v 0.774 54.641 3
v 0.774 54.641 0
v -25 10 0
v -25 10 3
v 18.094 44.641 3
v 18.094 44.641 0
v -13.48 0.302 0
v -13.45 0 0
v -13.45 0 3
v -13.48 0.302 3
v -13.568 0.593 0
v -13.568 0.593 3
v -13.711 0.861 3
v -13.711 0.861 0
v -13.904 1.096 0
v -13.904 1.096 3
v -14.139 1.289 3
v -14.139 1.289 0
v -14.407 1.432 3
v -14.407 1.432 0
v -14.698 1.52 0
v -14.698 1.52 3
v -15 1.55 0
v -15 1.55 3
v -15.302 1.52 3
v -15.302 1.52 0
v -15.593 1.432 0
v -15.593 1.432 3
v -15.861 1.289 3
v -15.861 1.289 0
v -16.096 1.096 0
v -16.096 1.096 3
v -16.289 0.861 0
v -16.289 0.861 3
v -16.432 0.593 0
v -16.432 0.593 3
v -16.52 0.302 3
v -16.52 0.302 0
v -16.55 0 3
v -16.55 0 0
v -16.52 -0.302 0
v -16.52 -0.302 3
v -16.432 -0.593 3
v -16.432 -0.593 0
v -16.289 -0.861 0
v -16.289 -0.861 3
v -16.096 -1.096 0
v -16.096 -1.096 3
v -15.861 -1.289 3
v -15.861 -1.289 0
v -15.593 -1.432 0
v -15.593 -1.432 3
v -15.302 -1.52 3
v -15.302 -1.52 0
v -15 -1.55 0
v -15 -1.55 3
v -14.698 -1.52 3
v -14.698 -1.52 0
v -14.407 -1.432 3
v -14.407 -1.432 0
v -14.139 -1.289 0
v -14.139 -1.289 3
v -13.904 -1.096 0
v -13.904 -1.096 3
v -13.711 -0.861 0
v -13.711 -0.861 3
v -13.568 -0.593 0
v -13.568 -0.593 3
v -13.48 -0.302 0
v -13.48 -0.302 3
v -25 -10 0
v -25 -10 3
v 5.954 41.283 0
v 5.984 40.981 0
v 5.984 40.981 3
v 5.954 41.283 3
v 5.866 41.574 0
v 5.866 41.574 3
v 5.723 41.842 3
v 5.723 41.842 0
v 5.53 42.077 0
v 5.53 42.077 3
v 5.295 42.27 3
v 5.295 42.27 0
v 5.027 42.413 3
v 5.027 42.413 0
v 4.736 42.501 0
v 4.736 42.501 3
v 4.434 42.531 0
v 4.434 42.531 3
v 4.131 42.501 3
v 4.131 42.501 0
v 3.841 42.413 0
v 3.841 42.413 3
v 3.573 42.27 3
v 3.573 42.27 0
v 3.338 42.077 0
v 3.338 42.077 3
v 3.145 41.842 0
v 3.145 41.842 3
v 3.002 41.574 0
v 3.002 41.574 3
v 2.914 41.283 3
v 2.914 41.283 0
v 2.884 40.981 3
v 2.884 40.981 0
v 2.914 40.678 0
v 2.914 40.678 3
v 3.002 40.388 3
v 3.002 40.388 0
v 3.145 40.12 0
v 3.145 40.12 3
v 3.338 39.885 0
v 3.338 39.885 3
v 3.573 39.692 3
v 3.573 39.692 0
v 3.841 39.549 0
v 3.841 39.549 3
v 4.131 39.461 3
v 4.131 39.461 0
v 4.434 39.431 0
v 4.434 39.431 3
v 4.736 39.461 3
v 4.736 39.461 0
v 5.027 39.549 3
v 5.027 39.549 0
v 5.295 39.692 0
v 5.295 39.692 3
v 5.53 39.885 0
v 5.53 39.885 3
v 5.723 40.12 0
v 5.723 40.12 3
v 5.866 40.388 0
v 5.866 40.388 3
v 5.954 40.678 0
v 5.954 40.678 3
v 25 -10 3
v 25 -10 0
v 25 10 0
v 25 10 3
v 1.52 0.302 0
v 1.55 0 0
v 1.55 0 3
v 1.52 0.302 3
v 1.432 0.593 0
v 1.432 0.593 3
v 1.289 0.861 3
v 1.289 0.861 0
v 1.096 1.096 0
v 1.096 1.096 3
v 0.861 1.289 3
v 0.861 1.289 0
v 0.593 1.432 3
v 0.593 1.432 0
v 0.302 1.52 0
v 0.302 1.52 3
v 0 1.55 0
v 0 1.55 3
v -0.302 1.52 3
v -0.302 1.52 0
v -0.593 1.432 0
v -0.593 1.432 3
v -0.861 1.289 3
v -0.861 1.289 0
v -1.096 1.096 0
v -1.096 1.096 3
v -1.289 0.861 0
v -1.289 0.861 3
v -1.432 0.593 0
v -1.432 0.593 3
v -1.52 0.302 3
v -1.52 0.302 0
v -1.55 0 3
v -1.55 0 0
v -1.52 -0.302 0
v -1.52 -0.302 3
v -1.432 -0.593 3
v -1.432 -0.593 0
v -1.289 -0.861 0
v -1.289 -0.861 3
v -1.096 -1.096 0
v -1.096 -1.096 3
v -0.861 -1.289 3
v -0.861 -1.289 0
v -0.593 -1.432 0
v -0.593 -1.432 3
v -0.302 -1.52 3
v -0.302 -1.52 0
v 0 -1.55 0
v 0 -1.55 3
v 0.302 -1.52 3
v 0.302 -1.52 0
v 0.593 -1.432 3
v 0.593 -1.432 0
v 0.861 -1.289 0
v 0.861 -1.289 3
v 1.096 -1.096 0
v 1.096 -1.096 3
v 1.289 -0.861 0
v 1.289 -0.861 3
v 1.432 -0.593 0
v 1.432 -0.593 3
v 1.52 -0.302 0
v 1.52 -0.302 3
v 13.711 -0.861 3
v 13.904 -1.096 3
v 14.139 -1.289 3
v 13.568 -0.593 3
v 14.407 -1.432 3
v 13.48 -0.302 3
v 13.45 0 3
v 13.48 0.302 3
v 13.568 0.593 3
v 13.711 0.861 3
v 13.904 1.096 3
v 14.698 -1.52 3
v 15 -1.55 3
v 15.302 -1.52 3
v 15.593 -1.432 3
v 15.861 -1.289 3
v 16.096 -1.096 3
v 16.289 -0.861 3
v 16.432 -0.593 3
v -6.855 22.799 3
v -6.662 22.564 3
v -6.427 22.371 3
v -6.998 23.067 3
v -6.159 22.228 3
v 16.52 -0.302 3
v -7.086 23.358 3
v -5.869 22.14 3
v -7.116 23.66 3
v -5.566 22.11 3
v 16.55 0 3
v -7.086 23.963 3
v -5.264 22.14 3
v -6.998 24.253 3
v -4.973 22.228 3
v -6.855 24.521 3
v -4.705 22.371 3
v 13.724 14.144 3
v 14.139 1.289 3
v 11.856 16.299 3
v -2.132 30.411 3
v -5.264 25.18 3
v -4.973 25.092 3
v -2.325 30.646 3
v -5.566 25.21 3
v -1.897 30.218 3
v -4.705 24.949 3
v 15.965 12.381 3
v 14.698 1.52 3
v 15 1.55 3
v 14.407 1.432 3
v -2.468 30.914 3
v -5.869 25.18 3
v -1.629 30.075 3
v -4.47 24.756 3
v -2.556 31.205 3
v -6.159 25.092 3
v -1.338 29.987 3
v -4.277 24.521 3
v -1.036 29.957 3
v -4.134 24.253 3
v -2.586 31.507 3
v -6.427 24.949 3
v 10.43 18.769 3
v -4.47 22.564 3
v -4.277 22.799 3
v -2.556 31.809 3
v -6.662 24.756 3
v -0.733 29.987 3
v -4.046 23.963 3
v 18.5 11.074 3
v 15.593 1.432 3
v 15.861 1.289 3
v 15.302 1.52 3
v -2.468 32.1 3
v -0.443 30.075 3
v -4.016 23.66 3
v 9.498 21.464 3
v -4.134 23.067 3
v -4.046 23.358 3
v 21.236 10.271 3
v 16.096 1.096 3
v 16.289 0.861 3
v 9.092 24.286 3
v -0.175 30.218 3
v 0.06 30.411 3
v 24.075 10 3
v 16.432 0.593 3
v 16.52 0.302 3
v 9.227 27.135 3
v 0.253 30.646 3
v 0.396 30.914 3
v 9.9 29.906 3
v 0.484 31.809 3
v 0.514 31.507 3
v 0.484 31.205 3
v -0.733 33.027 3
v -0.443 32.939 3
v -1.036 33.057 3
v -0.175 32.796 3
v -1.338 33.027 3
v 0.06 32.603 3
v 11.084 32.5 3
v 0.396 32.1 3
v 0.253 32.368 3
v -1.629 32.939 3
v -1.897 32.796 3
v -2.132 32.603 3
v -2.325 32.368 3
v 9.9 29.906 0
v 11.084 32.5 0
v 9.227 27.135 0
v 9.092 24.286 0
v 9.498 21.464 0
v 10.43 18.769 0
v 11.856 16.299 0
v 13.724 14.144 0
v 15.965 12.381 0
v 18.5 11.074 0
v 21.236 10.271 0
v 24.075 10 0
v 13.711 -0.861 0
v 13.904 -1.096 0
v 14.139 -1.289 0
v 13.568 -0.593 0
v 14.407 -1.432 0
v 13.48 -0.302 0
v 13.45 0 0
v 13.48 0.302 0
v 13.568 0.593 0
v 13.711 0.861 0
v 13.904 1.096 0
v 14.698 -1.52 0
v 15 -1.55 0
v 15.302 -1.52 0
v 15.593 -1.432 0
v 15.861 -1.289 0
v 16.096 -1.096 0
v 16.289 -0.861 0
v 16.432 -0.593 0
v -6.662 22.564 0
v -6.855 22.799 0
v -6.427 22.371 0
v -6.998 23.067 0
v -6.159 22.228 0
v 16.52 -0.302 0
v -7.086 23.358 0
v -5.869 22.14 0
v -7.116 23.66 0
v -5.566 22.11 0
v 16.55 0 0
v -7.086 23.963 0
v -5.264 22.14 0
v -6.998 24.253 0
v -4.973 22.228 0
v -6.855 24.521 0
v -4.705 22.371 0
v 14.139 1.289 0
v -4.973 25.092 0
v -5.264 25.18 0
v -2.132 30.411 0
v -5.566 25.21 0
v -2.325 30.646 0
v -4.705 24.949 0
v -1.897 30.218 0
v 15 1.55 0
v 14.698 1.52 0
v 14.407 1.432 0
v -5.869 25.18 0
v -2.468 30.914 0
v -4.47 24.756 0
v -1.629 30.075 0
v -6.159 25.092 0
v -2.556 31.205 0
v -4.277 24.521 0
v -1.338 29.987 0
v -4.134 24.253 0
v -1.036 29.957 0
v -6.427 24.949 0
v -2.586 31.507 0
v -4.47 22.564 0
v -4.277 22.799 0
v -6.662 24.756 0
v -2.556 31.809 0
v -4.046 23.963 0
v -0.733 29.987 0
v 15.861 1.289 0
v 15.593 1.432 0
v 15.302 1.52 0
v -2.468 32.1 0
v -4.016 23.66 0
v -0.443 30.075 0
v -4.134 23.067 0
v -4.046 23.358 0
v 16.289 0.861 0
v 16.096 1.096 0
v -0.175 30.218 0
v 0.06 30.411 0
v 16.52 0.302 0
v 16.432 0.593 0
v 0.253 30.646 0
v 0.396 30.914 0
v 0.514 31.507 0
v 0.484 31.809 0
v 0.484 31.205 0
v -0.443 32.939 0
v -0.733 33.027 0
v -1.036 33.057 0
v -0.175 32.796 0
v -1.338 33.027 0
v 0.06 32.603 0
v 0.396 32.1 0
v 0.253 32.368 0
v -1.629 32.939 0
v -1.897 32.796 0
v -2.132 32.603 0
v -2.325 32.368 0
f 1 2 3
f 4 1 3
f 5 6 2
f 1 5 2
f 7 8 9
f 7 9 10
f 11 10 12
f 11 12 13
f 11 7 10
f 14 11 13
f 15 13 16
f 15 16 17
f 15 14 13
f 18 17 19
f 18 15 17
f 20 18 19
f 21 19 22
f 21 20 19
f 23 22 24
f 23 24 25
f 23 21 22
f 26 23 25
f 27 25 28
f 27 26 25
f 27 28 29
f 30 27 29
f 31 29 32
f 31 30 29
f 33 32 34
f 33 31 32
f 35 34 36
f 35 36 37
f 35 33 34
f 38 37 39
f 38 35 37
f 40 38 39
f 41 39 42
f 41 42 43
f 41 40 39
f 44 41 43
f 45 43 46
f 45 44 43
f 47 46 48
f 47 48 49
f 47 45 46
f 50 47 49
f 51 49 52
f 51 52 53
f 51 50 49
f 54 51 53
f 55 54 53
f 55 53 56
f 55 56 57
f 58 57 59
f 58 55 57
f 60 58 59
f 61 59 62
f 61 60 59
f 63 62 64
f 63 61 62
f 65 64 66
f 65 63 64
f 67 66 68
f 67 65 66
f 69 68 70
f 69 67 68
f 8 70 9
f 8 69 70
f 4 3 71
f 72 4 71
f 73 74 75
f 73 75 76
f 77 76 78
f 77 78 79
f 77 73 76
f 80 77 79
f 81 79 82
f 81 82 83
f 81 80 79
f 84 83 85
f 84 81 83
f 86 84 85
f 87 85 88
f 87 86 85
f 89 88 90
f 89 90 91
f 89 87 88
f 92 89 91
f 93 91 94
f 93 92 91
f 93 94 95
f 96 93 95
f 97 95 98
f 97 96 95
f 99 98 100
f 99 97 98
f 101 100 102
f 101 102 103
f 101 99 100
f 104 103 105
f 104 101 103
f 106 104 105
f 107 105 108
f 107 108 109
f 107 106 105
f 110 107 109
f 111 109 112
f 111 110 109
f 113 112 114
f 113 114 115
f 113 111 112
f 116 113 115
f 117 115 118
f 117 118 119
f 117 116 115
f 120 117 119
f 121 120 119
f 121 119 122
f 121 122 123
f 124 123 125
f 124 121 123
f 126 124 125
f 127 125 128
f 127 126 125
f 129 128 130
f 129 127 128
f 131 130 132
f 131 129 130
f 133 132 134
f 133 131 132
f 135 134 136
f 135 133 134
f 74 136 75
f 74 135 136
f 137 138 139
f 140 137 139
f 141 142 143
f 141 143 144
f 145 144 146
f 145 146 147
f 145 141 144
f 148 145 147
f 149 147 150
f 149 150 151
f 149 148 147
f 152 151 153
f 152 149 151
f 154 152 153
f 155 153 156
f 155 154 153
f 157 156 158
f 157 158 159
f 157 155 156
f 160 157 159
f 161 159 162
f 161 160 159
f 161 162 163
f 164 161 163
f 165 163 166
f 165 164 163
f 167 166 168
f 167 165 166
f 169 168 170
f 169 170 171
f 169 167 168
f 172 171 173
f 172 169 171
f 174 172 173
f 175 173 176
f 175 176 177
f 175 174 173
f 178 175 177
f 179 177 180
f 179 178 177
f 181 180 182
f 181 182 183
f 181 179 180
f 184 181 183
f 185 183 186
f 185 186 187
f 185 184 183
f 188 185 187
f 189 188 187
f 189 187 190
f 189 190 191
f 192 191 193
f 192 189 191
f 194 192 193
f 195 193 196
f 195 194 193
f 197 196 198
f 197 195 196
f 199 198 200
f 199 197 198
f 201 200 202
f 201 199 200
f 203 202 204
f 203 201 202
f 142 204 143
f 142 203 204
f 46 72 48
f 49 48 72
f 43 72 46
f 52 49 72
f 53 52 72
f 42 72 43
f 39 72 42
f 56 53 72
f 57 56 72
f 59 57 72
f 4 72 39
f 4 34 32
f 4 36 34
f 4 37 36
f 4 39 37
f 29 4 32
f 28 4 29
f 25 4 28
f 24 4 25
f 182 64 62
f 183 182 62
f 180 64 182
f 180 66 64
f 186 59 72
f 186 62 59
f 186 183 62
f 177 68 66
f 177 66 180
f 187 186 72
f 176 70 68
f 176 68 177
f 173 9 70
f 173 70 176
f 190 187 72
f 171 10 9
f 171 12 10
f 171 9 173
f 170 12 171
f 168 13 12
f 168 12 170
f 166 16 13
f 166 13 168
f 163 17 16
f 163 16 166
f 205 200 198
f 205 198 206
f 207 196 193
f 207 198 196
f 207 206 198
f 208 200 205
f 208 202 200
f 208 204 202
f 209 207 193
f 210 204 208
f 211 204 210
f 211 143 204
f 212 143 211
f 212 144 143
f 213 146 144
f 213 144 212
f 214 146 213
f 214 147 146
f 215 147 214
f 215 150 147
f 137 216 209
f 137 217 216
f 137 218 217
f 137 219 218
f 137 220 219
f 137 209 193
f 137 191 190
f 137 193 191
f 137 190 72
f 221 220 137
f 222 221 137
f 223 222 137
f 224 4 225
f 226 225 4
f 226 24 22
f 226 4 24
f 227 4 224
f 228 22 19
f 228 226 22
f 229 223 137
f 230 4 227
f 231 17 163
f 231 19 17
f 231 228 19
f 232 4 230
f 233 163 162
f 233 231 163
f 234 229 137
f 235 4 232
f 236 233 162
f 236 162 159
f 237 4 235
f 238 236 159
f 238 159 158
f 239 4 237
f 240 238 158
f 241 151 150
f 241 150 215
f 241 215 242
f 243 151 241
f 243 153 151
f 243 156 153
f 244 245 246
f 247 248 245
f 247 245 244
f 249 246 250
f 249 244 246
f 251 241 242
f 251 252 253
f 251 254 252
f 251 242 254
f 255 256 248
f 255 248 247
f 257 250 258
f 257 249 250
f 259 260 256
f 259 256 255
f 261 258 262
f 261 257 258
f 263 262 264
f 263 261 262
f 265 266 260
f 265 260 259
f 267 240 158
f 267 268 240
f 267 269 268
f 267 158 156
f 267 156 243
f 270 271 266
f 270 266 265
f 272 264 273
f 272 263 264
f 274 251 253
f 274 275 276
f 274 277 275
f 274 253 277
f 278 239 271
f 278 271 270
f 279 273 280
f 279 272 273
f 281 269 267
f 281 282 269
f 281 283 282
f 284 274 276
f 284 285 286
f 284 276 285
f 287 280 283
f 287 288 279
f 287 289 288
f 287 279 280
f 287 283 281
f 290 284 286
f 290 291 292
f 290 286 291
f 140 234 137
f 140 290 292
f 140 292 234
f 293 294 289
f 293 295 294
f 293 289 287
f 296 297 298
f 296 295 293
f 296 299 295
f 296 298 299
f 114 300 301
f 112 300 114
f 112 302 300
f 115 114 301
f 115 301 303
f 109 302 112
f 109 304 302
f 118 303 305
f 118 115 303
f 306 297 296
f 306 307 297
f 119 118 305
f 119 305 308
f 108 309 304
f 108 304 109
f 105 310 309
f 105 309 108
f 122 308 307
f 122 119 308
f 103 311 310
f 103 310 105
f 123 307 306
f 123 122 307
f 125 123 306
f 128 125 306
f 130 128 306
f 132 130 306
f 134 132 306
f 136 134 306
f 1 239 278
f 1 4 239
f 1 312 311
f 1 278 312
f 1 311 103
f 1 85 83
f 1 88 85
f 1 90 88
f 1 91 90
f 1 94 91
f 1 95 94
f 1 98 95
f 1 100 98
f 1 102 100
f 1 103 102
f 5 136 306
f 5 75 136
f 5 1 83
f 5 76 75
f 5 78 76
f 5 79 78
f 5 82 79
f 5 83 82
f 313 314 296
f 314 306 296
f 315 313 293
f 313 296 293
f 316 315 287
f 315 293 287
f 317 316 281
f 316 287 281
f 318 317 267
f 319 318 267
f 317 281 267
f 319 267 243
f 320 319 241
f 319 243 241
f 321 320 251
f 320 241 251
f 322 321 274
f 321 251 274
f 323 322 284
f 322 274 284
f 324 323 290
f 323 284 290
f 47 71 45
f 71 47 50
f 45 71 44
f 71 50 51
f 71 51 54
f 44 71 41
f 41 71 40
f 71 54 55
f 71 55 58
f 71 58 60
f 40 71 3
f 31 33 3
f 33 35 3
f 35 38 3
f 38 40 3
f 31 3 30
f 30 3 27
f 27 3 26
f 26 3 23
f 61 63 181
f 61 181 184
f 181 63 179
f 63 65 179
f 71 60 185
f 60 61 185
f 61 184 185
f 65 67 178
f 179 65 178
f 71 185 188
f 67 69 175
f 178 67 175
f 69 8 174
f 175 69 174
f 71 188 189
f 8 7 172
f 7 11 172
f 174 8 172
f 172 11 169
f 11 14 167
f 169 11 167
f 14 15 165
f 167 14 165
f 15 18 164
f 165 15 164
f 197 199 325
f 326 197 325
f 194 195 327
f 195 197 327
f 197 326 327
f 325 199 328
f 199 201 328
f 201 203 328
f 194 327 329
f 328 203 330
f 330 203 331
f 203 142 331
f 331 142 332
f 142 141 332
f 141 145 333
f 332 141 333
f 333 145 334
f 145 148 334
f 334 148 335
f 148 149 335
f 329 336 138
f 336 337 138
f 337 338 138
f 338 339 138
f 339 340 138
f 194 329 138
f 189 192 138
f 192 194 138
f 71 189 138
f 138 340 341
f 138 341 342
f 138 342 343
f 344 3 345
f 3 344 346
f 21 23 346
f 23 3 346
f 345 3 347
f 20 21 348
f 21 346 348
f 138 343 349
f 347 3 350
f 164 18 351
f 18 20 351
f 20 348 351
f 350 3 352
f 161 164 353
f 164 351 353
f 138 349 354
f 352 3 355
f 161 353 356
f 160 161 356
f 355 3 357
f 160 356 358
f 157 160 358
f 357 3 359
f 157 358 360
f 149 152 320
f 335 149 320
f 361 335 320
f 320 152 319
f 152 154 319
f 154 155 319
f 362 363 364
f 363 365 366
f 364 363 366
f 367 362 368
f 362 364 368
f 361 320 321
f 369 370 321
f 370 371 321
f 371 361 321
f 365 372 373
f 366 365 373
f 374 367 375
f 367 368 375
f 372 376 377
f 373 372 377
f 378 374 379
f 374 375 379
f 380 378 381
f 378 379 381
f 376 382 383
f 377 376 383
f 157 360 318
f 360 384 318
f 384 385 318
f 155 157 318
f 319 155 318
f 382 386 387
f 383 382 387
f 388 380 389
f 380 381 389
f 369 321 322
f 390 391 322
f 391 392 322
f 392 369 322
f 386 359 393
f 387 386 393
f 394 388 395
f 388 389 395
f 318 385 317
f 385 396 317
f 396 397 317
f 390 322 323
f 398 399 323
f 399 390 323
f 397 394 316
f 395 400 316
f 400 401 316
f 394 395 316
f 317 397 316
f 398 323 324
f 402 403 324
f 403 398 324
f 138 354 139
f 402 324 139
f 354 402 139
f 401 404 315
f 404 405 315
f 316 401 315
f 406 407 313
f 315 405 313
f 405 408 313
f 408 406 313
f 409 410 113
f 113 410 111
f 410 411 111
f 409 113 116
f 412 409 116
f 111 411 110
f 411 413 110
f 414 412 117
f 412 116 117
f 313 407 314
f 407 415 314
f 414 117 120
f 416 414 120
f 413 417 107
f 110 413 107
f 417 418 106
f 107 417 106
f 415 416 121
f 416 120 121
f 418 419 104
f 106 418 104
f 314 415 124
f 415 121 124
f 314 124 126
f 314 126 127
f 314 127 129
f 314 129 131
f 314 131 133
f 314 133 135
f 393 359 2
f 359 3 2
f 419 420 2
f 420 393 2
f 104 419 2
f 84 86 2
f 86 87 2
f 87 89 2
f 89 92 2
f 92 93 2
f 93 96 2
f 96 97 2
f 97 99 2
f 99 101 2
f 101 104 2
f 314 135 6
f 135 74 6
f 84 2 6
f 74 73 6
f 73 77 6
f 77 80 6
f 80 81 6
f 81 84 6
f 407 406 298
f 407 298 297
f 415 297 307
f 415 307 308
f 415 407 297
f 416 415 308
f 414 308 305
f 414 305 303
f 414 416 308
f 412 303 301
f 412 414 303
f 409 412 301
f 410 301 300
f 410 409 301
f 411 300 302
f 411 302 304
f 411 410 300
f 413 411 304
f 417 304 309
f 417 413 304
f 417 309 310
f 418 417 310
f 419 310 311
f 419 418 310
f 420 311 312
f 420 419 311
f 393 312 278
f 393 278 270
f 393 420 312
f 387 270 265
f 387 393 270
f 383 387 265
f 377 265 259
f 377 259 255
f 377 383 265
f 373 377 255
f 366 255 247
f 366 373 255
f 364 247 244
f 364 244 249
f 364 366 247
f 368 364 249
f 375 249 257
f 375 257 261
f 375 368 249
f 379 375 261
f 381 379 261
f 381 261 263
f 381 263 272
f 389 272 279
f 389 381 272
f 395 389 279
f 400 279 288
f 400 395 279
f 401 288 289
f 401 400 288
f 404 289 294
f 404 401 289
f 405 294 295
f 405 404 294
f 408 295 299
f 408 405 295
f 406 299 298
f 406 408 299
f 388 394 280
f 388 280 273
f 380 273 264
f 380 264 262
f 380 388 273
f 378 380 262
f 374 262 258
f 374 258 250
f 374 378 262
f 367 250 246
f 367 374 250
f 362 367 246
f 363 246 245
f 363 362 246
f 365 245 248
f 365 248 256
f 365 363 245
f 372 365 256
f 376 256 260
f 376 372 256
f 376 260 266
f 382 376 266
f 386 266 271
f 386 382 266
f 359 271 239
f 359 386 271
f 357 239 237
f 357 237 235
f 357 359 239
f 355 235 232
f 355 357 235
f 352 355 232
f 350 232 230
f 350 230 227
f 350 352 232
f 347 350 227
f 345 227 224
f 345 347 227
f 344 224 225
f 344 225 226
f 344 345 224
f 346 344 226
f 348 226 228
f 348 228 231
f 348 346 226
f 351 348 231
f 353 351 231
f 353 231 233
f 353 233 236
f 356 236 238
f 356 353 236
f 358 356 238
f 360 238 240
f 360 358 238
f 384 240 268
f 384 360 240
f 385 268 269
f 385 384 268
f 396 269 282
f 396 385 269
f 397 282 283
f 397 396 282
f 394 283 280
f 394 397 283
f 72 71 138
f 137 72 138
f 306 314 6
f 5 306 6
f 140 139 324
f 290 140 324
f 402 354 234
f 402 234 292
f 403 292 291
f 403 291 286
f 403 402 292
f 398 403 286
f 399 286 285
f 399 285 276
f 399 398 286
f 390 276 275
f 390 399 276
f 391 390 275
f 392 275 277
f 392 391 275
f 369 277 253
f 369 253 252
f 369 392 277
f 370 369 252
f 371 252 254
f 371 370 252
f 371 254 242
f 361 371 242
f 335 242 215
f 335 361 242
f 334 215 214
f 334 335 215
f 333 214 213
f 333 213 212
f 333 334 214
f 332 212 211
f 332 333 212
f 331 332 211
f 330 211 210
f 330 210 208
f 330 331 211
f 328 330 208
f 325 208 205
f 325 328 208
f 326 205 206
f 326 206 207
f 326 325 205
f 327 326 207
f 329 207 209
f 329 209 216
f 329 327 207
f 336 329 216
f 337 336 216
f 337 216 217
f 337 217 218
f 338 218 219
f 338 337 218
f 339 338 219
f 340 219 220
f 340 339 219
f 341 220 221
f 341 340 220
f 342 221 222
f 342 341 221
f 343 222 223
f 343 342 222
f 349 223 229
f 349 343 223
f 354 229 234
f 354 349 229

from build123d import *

# Parameters (mm, degrees)
SKETCH_1_R      = 1.55
EXTRUDE_1_DEPTH = 3
FILLET_1_R      = 15


with BuildPart() as part:
    # 草图1 → 凸台-拉伸1 (new body)
    with BuildSketch(Plane.XY):
        Polygon((0.773502692, 54.641016151), (-25, 10), (-25, -10), (25, -10), (25, 10), (-1.905989232, 10), (18.094010768, 44.641016151), align=None)
        with Locations((-5.56624327, 23.660254038)):
            Circle(SKETCH_1_R, mode=Mode.SUBTRACT)
        with Locations((-1.035875539, 31.507081126)):
            Circle(SKETCH_1_R, mode=Mode.SUBTRACT)
        with Locations((4.43375673, 40.980762114)):
            Circle(SKETCH_1_R, mode=Mode.SUBTRACT)
        with Locations((15, 0)):
            Circle(SKETCH_1_R, mode=Mode.SUBTRACT)
        with Locations((-15, 0)):
            Circle(SKETCH_1_R, mode=Mode.SUBTRACT)
        Circle(SKETCH_1_R, mode=Mode.SUBTRACT)
    extrude(amount=EXTRUDE_1_DEPTH)

    # 圆角1
    fillet_1_edges = [part.edges().sort_by_distance(p)[0] for p in [
        (-1.905989232, 10, 1.5),
    ]]
    fillet(fillet_1_edges, radius=FILLET_1_R)


solid = part.part
